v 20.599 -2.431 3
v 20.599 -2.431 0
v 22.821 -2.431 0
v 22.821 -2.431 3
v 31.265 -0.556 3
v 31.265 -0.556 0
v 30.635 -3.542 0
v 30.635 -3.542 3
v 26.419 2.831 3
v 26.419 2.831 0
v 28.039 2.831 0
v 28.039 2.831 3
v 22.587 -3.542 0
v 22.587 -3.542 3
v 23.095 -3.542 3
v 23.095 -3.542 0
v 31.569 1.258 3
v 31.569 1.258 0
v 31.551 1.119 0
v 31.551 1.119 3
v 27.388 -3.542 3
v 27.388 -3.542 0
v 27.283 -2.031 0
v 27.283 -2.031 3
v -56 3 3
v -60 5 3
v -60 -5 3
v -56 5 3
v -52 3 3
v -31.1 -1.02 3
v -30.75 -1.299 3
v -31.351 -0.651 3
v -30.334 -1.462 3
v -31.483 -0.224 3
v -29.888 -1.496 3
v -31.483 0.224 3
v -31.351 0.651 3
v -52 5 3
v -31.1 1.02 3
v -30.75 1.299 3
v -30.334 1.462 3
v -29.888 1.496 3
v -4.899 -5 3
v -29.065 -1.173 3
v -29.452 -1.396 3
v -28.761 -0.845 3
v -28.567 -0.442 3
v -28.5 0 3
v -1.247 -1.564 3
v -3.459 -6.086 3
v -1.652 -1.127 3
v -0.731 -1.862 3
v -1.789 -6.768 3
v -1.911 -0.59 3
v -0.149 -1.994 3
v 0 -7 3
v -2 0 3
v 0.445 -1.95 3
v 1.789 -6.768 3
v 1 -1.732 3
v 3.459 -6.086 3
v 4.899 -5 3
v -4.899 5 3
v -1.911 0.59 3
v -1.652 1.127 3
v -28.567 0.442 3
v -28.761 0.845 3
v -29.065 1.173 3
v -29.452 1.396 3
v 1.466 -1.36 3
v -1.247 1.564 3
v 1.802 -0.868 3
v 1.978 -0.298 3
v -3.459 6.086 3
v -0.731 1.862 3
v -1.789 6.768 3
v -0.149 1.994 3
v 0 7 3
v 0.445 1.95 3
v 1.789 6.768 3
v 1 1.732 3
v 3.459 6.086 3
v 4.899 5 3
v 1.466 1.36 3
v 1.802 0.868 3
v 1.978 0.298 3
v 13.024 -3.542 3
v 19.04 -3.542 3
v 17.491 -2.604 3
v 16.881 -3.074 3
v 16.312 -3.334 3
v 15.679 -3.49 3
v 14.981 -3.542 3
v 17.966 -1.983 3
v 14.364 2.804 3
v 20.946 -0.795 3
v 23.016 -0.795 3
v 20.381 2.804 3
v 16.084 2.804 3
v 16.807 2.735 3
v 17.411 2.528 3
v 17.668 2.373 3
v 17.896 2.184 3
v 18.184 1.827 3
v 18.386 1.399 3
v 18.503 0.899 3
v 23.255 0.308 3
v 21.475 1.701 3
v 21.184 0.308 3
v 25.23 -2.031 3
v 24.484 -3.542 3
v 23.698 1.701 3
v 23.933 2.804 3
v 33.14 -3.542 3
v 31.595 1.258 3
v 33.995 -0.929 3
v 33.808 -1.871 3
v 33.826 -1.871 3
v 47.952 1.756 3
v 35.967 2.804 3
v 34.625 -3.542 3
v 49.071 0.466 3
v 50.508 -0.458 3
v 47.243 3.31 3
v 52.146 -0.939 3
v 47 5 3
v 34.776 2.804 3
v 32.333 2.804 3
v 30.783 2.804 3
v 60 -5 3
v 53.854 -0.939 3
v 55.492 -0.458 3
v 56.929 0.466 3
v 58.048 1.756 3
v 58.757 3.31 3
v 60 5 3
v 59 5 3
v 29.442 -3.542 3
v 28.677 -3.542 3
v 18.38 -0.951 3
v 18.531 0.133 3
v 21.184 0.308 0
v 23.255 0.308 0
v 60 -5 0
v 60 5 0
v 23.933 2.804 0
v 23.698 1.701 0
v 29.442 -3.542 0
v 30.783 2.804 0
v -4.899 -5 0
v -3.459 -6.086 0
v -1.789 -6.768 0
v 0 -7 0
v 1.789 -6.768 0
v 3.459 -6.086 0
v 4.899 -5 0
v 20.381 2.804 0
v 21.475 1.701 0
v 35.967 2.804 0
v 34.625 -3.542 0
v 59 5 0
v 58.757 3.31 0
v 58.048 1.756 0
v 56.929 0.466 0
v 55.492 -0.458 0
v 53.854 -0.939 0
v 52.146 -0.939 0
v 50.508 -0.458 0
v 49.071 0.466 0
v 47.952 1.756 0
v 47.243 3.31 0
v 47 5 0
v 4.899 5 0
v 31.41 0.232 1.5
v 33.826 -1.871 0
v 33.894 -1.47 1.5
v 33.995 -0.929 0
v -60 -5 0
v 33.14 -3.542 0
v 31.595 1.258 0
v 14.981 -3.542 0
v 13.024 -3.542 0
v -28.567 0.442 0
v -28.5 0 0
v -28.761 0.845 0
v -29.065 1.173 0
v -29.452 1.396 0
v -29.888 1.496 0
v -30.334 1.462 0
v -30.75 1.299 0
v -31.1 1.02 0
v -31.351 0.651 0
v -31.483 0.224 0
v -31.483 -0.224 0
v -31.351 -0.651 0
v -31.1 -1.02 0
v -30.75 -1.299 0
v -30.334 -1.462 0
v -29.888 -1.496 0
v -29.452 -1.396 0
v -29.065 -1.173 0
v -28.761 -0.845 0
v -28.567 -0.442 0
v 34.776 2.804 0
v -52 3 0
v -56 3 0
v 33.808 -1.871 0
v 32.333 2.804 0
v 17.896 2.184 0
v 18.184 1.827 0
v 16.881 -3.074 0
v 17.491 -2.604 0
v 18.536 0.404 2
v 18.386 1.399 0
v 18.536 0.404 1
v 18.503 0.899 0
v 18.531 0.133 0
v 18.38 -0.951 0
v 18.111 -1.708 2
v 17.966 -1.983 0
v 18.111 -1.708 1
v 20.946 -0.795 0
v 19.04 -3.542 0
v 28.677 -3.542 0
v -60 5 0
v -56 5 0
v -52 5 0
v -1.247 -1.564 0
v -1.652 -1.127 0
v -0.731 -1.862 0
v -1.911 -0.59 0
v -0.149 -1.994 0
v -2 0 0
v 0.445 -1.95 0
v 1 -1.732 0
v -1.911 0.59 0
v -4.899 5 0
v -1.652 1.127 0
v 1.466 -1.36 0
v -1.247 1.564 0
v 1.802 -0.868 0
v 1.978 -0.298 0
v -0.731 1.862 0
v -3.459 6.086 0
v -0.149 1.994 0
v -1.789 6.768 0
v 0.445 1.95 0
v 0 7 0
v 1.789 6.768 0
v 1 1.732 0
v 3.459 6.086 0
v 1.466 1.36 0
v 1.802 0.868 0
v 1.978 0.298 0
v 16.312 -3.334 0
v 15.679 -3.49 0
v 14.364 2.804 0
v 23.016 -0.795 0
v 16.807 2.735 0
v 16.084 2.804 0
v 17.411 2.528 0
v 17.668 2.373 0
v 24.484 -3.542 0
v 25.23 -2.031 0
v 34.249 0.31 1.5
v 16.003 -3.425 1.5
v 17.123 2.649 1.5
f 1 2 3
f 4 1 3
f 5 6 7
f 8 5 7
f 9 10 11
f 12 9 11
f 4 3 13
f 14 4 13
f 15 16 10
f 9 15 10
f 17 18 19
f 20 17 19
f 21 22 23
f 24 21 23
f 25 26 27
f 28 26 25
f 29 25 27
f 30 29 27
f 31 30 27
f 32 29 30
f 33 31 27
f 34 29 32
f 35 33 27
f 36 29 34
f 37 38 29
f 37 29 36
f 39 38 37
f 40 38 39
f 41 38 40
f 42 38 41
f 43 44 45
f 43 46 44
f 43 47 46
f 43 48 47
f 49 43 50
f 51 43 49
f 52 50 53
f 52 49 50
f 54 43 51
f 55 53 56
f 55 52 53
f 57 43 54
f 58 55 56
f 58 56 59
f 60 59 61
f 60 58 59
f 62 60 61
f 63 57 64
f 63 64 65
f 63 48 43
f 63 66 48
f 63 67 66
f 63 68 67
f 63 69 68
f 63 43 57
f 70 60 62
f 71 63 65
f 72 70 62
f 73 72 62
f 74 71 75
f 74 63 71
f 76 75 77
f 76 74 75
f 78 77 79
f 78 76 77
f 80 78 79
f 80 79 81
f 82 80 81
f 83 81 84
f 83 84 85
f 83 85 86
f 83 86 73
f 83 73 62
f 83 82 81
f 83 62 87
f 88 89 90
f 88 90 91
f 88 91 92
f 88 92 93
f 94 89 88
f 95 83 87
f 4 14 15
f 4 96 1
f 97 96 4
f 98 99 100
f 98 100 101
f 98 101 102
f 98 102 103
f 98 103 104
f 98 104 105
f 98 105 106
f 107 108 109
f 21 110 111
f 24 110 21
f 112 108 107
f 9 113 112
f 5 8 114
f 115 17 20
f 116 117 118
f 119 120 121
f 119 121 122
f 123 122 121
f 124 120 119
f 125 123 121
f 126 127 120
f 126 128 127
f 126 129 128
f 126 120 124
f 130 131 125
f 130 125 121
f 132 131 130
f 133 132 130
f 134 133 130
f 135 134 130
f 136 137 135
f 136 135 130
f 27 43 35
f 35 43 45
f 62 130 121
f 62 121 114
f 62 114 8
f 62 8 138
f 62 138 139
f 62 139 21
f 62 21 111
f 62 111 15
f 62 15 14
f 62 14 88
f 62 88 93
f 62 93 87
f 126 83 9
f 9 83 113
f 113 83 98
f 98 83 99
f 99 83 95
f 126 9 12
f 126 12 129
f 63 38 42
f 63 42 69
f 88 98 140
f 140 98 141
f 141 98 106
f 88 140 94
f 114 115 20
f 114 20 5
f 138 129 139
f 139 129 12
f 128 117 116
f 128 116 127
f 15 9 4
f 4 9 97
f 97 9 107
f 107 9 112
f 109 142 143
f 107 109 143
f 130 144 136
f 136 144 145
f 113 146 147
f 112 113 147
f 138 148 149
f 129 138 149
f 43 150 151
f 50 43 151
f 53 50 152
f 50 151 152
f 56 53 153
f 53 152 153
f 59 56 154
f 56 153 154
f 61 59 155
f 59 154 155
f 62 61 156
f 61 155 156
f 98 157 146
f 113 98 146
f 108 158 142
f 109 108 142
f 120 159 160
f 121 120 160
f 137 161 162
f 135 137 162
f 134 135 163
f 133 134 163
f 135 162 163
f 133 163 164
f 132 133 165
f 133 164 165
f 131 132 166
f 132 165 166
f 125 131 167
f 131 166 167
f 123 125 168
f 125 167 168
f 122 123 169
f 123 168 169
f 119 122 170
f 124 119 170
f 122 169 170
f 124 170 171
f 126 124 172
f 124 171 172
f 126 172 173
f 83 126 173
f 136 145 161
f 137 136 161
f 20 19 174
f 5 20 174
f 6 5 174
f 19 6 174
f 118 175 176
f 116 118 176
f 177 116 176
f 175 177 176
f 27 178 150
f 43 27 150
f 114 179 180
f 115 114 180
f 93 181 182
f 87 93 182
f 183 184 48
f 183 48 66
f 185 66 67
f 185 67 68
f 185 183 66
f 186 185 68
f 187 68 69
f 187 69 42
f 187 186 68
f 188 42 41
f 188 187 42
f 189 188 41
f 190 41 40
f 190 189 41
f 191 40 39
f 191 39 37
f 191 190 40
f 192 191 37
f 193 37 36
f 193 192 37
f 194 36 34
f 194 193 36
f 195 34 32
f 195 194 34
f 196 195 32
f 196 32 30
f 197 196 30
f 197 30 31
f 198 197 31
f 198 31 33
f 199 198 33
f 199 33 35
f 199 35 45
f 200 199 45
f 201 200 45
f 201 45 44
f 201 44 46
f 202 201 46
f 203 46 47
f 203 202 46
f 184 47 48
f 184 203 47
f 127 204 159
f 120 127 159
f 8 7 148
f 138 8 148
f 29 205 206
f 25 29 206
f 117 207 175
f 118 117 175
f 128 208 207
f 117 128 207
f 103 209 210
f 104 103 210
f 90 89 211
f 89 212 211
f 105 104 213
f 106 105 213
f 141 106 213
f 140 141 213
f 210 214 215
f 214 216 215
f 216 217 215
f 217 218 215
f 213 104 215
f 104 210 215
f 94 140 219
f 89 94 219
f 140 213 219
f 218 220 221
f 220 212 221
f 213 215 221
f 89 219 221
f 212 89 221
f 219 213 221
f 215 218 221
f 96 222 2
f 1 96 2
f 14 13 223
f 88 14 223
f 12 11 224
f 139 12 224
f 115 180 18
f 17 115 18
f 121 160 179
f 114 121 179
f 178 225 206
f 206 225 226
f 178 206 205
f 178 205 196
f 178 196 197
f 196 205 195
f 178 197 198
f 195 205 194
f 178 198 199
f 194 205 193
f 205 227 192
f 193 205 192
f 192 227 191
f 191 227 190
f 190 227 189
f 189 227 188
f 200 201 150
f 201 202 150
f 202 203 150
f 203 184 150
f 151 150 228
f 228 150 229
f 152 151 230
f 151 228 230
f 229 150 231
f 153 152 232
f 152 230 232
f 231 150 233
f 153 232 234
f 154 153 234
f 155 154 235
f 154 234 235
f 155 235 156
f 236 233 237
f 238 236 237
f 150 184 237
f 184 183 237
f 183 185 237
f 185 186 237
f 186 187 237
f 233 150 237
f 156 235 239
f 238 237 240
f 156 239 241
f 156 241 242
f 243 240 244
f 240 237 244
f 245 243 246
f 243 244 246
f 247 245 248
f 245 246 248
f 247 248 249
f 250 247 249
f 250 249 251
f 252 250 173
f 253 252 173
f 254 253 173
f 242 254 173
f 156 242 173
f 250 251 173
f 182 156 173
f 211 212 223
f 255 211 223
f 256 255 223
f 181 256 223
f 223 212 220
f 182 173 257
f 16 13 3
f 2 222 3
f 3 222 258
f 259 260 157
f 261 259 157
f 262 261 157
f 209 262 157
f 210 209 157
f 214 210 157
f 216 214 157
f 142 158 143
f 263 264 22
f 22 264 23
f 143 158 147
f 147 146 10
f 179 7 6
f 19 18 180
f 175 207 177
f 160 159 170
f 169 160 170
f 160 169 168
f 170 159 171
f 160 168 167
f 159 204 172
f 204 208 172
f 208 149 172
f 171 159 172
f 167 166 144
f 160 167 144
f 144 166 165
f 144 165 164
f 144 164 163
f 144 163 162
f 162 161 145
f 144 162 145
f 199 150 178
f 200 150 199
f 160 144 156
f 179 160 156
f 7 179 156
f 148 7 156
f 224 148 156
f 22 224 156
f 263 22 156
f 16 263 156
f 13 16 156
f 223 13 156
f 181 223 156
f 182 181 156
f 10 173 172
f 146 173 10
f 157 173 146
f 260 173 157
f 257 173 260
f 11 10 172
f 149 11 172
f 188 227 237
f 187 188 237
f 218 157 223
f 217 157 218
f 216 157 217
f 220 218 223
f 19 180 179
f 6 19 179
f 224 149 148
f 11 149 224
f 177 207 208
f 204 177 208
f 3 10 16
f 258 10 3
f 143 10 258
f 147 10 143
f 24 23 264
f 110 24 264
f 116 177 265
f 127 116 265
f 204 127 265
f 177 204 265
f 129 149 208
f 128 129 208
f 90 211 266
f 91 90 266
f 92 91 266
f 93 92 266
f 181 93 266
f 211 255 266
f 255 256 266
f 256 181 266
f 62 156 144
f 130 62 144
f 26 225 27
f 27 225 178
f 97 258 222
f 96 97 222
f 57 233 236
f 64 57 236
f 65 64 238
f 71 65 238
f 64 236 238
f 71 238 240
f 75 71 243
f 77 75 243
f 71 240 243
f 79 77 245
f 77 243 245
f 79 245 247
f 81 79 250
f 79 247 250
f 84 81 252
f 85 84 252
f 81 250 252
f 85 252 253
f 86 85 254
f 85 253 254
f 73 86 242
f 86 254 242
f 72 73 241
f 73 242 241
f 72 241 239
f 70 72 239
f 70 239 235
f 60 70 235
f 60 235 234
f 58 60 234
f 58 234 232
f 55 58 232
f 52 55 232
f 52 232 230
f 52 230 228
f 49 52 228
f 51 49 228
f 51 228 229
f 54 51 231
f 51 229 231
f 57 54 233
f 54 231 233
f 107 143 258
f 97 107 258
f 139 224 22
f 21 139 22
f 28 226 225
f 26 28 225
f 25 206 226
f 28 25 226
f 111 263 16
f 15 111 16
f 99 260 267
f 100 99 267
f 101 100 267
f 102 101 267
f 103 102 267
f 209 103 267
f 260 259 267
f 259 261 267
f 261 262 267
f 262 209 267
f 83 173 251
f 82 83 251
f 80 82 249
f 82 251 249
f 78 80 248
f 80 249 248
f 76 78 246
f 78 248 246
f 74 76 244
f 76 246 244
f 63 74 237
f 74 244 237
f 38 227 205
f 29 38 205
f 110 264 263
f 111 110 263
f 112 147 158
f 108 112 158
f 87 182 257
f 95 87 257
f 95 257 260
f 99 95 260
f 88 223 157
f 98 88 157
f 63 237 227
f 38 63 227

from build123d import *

# Parameters (mm, degrees)
F0_R     = 1.5
F1_DEPTH = 3


with BuildPart() as f1:
    # F0 (on Top) → F1 (new body)
    with BuildSketch(Plane.XY):
        with BuildLine():
            Line((-56, 5), (-60, 5))
            Line((-60, 5), (-60, -5))
            Line((-60, -5), (-4.8989794856, -5))
            ThreePointArc((-4.8989794856, -5), (-6.4534043883, -2.7117470016), (-7, 0))
            ThreePointArc((-7, 0), (-6.4534043883, 2.7117470016), (-4.8989794856, 5))
            Line((-4.8989794856, 5), (-52, 5))
            Line((-52, 5), (-52, 3))
            Line((-52, 3), (-56, 3))
            Line((-56, 3), (-56, 5))
        make_face()
        with Locations((-30, 0)):
            Circle(F0_R, mode=Mode.SUBTRACT)
        with BuildLine():
            ThreePointArc((4.8989794856, 5), (0, 7), (-4.8989794856, 5))
            Line((-4.8989794856, 5), (4.8989794856, 5))
        make_face()
        with BuildLine():
            Line((4.8989794856, -5), (-4.8989794856, -5))
            ThreePointArc((-4.8989794856, -5), (0, -7), (4.8989794856, -5))
        make_face()
        with BuildLine():
            ThreePointArc((-7, 0), (-6.4534043883, -2.7117470016), (-4.8989794856, -5))
            Line((-4.8989794856, -5), (4.8989794856, -5))
            ThreePointArc((4.8989794856, -5), (6.4534043883, -2.7117470016), (7, 0))
            ThreePointArc((7, 0), (6.4534043883, 2.7117470016), (4.8989794856, 5))
            Line((4.8989794856, 5), (-4.8989794856, 5))
            ThreePointArc((-4.8989794856, 5), (-6.4534043883, 2.7117470016), (-7, 0))
        make_face()
        with BuildLine():
            ThreePointArc((2, 0), (0, -2), (-2, 0))
            ThreePointArc((-2, 0), (0, 2), (2, 0))
        make_face(mode=Mode.SUBTRACT)
        with BuildLine():
            ThreePointArc((7, 0), (6.4534043883, -2.7117470016), (4.8989794856, -5))
            Line((4.8989794856, -5), (60, -5))
            Line((60, -5), (60, 5))
            Line((60, 5), (59, 5))
            ThreePointArc((59, 5), (53, -1), (47, 5))
            Line((47, 5), (4.8989794856, 5))
            ThreePointArc((4.8989794856, 5), (6.4534043883, 2.7117470016), (7, 0))
        make_face()
        with BuildLine():
            add(Edge.make_bspline(
                [(17.89625742, 2.1835303769), (18.5359551454, 1.5625860049), (18.5359551454, 0.4040454989)],
                knots=[0, 0, 0, 1, 1, 1], degree=2))
            add(Edge.make_bspline(
                [(18.5359551454, 0.4040454989), (18.5359551454, -0.8114496364), (18.1108791324, -1.7081377619)],
                knots=[0, 0, 0, 1, 1, 1], degree=2))
            add(Edge.make_bspline(
                [(18.1108791324, -1.7081377619), (17.6858031194, -2.6048258874), (16.8807980555, -3.0736597253)],
                knots=[0, 0, 0, 1, 1, 1], degree=2))
            add(Edge.make_bspline(
                [(16.8807980555, -3.0736597253), (16.0757929917, -3.5424935631), (14.9811528013, -3.5424935631)],
                knots=[0, 0, 0, 1, 1, 1], degree=2))
            Line((14.9811528013, -3.5424935631), (13.0238583492, -3.5424935631))
            Line((13.0238583492, -3.5424935631), (14.3643758412, 2.8044747489))
            Line((14.3643758412, 2.8044747489), (16.0841278154, 2.8044747489))
            add(Edge.make_bspline(
                [(16.0841278154, 2.8044747489), (17.2565596945, 2.8044747489), (17.89625742, 2.1835303769)],
                knots=[0, 0, 0, 1, 1, 1], degree=2))
        make_face(mode=Mode.SUBTRACT)
        Polygon((22.821443708, -2.4311837252), (22.5866795048, -3.5424935631), (19.0402119844, -3.5424935631), (20.3807294764, 2.8044747489), (23.932753546, 2.8044747489), (23.6979893427, 1.7014997347), (21.4753696668, 1.7014997347), (21.1836508343, 0.3081950254), (23.2548545448, 0.3081950254), (23.0159229297, -0.7947799888), (20.9461083565, -0.7947799888), (20.5988240321, -2.4311837252), align=None, mode=Mode.SUBTRACT)
        Polygon((27.3875380047, -3.5424935631), (27.2833527074, -2.0311121835), (25.2302077818, -2.0311121835), (24.4842410531, -3.5424935631), (23.0951037556, -3.5424935631), (26.4193093084, 2.8308683575), (28.0390433972, 2.8308683575), (28.6766574167, -3.5424935631), align=None, mode=Mode.SUBTRACT)
        with BuildLine():
            Line((35.9668499537, 2.8044747489), (34.6249433244, -3.5424935631))
            Line((34.6249433244, -3.5424935631), (33.1399555534, -3.5424935631))
            Line((33.1399555534, -3.5424935631), (31.5952348786, 1.2583649368))
            Line((31.5952348786, 1.2583649368), (31.56884127, 1.2583649368))
            Line((31.56884127, 1.2583649368), (31.5507824851, 1.1194512071))
            add(Edge.make_bspline(
                [(31.5507824851, 1.1194512071), (31.4118687554, 0.1817835313), (31.2646202019, -0.5558483737)],
                knots=[0, 0, 0, 1, 1, 1], degree=2))
            Line((31.2646202019, -0.5558483737), (30.6353410061, -3.5424935631))
            Line((30.6353410061, -3.5424935631), (29.4420720676, -3.5424935631))
            Line((29.4420720676, -3.5424935631), (30.7825895596, 2.8044747489))
            Line((30.7825895596, 2.8044747489), (32.3328667836, 2.8044747489))
            Line((32.3328667836, 2.8044747489), (33.8081305935, -1.8713613943))
            Line((33.8081305935, -1.8713613943), (33.8261893783, -1.8713613943))
            add(Edge.make_bspline(
                [(33.8261893783, -1.8713613943), (33.8775874583, -1.5407467175), (33.99496956, -0.928831738)],
                knots=[0, 0, 0, 1, 1, 1], degree=2))
            add(Edge.make_bspline(
                [(33.99496956, -0.928831738), (34.1123516616, -0.3169167585), (34.7763592898, 2.8044747489)],
                knots=[0, 0, 0, 1, 1, 1], degree=2))
            Line((34.7763592898, 2.8044747489), (35.9668499537, 2.8044747489))
        make_face(mode=Mode.SUBTRACT)
    extrude(amount=F1_DEPTH)


solid = f1.part
